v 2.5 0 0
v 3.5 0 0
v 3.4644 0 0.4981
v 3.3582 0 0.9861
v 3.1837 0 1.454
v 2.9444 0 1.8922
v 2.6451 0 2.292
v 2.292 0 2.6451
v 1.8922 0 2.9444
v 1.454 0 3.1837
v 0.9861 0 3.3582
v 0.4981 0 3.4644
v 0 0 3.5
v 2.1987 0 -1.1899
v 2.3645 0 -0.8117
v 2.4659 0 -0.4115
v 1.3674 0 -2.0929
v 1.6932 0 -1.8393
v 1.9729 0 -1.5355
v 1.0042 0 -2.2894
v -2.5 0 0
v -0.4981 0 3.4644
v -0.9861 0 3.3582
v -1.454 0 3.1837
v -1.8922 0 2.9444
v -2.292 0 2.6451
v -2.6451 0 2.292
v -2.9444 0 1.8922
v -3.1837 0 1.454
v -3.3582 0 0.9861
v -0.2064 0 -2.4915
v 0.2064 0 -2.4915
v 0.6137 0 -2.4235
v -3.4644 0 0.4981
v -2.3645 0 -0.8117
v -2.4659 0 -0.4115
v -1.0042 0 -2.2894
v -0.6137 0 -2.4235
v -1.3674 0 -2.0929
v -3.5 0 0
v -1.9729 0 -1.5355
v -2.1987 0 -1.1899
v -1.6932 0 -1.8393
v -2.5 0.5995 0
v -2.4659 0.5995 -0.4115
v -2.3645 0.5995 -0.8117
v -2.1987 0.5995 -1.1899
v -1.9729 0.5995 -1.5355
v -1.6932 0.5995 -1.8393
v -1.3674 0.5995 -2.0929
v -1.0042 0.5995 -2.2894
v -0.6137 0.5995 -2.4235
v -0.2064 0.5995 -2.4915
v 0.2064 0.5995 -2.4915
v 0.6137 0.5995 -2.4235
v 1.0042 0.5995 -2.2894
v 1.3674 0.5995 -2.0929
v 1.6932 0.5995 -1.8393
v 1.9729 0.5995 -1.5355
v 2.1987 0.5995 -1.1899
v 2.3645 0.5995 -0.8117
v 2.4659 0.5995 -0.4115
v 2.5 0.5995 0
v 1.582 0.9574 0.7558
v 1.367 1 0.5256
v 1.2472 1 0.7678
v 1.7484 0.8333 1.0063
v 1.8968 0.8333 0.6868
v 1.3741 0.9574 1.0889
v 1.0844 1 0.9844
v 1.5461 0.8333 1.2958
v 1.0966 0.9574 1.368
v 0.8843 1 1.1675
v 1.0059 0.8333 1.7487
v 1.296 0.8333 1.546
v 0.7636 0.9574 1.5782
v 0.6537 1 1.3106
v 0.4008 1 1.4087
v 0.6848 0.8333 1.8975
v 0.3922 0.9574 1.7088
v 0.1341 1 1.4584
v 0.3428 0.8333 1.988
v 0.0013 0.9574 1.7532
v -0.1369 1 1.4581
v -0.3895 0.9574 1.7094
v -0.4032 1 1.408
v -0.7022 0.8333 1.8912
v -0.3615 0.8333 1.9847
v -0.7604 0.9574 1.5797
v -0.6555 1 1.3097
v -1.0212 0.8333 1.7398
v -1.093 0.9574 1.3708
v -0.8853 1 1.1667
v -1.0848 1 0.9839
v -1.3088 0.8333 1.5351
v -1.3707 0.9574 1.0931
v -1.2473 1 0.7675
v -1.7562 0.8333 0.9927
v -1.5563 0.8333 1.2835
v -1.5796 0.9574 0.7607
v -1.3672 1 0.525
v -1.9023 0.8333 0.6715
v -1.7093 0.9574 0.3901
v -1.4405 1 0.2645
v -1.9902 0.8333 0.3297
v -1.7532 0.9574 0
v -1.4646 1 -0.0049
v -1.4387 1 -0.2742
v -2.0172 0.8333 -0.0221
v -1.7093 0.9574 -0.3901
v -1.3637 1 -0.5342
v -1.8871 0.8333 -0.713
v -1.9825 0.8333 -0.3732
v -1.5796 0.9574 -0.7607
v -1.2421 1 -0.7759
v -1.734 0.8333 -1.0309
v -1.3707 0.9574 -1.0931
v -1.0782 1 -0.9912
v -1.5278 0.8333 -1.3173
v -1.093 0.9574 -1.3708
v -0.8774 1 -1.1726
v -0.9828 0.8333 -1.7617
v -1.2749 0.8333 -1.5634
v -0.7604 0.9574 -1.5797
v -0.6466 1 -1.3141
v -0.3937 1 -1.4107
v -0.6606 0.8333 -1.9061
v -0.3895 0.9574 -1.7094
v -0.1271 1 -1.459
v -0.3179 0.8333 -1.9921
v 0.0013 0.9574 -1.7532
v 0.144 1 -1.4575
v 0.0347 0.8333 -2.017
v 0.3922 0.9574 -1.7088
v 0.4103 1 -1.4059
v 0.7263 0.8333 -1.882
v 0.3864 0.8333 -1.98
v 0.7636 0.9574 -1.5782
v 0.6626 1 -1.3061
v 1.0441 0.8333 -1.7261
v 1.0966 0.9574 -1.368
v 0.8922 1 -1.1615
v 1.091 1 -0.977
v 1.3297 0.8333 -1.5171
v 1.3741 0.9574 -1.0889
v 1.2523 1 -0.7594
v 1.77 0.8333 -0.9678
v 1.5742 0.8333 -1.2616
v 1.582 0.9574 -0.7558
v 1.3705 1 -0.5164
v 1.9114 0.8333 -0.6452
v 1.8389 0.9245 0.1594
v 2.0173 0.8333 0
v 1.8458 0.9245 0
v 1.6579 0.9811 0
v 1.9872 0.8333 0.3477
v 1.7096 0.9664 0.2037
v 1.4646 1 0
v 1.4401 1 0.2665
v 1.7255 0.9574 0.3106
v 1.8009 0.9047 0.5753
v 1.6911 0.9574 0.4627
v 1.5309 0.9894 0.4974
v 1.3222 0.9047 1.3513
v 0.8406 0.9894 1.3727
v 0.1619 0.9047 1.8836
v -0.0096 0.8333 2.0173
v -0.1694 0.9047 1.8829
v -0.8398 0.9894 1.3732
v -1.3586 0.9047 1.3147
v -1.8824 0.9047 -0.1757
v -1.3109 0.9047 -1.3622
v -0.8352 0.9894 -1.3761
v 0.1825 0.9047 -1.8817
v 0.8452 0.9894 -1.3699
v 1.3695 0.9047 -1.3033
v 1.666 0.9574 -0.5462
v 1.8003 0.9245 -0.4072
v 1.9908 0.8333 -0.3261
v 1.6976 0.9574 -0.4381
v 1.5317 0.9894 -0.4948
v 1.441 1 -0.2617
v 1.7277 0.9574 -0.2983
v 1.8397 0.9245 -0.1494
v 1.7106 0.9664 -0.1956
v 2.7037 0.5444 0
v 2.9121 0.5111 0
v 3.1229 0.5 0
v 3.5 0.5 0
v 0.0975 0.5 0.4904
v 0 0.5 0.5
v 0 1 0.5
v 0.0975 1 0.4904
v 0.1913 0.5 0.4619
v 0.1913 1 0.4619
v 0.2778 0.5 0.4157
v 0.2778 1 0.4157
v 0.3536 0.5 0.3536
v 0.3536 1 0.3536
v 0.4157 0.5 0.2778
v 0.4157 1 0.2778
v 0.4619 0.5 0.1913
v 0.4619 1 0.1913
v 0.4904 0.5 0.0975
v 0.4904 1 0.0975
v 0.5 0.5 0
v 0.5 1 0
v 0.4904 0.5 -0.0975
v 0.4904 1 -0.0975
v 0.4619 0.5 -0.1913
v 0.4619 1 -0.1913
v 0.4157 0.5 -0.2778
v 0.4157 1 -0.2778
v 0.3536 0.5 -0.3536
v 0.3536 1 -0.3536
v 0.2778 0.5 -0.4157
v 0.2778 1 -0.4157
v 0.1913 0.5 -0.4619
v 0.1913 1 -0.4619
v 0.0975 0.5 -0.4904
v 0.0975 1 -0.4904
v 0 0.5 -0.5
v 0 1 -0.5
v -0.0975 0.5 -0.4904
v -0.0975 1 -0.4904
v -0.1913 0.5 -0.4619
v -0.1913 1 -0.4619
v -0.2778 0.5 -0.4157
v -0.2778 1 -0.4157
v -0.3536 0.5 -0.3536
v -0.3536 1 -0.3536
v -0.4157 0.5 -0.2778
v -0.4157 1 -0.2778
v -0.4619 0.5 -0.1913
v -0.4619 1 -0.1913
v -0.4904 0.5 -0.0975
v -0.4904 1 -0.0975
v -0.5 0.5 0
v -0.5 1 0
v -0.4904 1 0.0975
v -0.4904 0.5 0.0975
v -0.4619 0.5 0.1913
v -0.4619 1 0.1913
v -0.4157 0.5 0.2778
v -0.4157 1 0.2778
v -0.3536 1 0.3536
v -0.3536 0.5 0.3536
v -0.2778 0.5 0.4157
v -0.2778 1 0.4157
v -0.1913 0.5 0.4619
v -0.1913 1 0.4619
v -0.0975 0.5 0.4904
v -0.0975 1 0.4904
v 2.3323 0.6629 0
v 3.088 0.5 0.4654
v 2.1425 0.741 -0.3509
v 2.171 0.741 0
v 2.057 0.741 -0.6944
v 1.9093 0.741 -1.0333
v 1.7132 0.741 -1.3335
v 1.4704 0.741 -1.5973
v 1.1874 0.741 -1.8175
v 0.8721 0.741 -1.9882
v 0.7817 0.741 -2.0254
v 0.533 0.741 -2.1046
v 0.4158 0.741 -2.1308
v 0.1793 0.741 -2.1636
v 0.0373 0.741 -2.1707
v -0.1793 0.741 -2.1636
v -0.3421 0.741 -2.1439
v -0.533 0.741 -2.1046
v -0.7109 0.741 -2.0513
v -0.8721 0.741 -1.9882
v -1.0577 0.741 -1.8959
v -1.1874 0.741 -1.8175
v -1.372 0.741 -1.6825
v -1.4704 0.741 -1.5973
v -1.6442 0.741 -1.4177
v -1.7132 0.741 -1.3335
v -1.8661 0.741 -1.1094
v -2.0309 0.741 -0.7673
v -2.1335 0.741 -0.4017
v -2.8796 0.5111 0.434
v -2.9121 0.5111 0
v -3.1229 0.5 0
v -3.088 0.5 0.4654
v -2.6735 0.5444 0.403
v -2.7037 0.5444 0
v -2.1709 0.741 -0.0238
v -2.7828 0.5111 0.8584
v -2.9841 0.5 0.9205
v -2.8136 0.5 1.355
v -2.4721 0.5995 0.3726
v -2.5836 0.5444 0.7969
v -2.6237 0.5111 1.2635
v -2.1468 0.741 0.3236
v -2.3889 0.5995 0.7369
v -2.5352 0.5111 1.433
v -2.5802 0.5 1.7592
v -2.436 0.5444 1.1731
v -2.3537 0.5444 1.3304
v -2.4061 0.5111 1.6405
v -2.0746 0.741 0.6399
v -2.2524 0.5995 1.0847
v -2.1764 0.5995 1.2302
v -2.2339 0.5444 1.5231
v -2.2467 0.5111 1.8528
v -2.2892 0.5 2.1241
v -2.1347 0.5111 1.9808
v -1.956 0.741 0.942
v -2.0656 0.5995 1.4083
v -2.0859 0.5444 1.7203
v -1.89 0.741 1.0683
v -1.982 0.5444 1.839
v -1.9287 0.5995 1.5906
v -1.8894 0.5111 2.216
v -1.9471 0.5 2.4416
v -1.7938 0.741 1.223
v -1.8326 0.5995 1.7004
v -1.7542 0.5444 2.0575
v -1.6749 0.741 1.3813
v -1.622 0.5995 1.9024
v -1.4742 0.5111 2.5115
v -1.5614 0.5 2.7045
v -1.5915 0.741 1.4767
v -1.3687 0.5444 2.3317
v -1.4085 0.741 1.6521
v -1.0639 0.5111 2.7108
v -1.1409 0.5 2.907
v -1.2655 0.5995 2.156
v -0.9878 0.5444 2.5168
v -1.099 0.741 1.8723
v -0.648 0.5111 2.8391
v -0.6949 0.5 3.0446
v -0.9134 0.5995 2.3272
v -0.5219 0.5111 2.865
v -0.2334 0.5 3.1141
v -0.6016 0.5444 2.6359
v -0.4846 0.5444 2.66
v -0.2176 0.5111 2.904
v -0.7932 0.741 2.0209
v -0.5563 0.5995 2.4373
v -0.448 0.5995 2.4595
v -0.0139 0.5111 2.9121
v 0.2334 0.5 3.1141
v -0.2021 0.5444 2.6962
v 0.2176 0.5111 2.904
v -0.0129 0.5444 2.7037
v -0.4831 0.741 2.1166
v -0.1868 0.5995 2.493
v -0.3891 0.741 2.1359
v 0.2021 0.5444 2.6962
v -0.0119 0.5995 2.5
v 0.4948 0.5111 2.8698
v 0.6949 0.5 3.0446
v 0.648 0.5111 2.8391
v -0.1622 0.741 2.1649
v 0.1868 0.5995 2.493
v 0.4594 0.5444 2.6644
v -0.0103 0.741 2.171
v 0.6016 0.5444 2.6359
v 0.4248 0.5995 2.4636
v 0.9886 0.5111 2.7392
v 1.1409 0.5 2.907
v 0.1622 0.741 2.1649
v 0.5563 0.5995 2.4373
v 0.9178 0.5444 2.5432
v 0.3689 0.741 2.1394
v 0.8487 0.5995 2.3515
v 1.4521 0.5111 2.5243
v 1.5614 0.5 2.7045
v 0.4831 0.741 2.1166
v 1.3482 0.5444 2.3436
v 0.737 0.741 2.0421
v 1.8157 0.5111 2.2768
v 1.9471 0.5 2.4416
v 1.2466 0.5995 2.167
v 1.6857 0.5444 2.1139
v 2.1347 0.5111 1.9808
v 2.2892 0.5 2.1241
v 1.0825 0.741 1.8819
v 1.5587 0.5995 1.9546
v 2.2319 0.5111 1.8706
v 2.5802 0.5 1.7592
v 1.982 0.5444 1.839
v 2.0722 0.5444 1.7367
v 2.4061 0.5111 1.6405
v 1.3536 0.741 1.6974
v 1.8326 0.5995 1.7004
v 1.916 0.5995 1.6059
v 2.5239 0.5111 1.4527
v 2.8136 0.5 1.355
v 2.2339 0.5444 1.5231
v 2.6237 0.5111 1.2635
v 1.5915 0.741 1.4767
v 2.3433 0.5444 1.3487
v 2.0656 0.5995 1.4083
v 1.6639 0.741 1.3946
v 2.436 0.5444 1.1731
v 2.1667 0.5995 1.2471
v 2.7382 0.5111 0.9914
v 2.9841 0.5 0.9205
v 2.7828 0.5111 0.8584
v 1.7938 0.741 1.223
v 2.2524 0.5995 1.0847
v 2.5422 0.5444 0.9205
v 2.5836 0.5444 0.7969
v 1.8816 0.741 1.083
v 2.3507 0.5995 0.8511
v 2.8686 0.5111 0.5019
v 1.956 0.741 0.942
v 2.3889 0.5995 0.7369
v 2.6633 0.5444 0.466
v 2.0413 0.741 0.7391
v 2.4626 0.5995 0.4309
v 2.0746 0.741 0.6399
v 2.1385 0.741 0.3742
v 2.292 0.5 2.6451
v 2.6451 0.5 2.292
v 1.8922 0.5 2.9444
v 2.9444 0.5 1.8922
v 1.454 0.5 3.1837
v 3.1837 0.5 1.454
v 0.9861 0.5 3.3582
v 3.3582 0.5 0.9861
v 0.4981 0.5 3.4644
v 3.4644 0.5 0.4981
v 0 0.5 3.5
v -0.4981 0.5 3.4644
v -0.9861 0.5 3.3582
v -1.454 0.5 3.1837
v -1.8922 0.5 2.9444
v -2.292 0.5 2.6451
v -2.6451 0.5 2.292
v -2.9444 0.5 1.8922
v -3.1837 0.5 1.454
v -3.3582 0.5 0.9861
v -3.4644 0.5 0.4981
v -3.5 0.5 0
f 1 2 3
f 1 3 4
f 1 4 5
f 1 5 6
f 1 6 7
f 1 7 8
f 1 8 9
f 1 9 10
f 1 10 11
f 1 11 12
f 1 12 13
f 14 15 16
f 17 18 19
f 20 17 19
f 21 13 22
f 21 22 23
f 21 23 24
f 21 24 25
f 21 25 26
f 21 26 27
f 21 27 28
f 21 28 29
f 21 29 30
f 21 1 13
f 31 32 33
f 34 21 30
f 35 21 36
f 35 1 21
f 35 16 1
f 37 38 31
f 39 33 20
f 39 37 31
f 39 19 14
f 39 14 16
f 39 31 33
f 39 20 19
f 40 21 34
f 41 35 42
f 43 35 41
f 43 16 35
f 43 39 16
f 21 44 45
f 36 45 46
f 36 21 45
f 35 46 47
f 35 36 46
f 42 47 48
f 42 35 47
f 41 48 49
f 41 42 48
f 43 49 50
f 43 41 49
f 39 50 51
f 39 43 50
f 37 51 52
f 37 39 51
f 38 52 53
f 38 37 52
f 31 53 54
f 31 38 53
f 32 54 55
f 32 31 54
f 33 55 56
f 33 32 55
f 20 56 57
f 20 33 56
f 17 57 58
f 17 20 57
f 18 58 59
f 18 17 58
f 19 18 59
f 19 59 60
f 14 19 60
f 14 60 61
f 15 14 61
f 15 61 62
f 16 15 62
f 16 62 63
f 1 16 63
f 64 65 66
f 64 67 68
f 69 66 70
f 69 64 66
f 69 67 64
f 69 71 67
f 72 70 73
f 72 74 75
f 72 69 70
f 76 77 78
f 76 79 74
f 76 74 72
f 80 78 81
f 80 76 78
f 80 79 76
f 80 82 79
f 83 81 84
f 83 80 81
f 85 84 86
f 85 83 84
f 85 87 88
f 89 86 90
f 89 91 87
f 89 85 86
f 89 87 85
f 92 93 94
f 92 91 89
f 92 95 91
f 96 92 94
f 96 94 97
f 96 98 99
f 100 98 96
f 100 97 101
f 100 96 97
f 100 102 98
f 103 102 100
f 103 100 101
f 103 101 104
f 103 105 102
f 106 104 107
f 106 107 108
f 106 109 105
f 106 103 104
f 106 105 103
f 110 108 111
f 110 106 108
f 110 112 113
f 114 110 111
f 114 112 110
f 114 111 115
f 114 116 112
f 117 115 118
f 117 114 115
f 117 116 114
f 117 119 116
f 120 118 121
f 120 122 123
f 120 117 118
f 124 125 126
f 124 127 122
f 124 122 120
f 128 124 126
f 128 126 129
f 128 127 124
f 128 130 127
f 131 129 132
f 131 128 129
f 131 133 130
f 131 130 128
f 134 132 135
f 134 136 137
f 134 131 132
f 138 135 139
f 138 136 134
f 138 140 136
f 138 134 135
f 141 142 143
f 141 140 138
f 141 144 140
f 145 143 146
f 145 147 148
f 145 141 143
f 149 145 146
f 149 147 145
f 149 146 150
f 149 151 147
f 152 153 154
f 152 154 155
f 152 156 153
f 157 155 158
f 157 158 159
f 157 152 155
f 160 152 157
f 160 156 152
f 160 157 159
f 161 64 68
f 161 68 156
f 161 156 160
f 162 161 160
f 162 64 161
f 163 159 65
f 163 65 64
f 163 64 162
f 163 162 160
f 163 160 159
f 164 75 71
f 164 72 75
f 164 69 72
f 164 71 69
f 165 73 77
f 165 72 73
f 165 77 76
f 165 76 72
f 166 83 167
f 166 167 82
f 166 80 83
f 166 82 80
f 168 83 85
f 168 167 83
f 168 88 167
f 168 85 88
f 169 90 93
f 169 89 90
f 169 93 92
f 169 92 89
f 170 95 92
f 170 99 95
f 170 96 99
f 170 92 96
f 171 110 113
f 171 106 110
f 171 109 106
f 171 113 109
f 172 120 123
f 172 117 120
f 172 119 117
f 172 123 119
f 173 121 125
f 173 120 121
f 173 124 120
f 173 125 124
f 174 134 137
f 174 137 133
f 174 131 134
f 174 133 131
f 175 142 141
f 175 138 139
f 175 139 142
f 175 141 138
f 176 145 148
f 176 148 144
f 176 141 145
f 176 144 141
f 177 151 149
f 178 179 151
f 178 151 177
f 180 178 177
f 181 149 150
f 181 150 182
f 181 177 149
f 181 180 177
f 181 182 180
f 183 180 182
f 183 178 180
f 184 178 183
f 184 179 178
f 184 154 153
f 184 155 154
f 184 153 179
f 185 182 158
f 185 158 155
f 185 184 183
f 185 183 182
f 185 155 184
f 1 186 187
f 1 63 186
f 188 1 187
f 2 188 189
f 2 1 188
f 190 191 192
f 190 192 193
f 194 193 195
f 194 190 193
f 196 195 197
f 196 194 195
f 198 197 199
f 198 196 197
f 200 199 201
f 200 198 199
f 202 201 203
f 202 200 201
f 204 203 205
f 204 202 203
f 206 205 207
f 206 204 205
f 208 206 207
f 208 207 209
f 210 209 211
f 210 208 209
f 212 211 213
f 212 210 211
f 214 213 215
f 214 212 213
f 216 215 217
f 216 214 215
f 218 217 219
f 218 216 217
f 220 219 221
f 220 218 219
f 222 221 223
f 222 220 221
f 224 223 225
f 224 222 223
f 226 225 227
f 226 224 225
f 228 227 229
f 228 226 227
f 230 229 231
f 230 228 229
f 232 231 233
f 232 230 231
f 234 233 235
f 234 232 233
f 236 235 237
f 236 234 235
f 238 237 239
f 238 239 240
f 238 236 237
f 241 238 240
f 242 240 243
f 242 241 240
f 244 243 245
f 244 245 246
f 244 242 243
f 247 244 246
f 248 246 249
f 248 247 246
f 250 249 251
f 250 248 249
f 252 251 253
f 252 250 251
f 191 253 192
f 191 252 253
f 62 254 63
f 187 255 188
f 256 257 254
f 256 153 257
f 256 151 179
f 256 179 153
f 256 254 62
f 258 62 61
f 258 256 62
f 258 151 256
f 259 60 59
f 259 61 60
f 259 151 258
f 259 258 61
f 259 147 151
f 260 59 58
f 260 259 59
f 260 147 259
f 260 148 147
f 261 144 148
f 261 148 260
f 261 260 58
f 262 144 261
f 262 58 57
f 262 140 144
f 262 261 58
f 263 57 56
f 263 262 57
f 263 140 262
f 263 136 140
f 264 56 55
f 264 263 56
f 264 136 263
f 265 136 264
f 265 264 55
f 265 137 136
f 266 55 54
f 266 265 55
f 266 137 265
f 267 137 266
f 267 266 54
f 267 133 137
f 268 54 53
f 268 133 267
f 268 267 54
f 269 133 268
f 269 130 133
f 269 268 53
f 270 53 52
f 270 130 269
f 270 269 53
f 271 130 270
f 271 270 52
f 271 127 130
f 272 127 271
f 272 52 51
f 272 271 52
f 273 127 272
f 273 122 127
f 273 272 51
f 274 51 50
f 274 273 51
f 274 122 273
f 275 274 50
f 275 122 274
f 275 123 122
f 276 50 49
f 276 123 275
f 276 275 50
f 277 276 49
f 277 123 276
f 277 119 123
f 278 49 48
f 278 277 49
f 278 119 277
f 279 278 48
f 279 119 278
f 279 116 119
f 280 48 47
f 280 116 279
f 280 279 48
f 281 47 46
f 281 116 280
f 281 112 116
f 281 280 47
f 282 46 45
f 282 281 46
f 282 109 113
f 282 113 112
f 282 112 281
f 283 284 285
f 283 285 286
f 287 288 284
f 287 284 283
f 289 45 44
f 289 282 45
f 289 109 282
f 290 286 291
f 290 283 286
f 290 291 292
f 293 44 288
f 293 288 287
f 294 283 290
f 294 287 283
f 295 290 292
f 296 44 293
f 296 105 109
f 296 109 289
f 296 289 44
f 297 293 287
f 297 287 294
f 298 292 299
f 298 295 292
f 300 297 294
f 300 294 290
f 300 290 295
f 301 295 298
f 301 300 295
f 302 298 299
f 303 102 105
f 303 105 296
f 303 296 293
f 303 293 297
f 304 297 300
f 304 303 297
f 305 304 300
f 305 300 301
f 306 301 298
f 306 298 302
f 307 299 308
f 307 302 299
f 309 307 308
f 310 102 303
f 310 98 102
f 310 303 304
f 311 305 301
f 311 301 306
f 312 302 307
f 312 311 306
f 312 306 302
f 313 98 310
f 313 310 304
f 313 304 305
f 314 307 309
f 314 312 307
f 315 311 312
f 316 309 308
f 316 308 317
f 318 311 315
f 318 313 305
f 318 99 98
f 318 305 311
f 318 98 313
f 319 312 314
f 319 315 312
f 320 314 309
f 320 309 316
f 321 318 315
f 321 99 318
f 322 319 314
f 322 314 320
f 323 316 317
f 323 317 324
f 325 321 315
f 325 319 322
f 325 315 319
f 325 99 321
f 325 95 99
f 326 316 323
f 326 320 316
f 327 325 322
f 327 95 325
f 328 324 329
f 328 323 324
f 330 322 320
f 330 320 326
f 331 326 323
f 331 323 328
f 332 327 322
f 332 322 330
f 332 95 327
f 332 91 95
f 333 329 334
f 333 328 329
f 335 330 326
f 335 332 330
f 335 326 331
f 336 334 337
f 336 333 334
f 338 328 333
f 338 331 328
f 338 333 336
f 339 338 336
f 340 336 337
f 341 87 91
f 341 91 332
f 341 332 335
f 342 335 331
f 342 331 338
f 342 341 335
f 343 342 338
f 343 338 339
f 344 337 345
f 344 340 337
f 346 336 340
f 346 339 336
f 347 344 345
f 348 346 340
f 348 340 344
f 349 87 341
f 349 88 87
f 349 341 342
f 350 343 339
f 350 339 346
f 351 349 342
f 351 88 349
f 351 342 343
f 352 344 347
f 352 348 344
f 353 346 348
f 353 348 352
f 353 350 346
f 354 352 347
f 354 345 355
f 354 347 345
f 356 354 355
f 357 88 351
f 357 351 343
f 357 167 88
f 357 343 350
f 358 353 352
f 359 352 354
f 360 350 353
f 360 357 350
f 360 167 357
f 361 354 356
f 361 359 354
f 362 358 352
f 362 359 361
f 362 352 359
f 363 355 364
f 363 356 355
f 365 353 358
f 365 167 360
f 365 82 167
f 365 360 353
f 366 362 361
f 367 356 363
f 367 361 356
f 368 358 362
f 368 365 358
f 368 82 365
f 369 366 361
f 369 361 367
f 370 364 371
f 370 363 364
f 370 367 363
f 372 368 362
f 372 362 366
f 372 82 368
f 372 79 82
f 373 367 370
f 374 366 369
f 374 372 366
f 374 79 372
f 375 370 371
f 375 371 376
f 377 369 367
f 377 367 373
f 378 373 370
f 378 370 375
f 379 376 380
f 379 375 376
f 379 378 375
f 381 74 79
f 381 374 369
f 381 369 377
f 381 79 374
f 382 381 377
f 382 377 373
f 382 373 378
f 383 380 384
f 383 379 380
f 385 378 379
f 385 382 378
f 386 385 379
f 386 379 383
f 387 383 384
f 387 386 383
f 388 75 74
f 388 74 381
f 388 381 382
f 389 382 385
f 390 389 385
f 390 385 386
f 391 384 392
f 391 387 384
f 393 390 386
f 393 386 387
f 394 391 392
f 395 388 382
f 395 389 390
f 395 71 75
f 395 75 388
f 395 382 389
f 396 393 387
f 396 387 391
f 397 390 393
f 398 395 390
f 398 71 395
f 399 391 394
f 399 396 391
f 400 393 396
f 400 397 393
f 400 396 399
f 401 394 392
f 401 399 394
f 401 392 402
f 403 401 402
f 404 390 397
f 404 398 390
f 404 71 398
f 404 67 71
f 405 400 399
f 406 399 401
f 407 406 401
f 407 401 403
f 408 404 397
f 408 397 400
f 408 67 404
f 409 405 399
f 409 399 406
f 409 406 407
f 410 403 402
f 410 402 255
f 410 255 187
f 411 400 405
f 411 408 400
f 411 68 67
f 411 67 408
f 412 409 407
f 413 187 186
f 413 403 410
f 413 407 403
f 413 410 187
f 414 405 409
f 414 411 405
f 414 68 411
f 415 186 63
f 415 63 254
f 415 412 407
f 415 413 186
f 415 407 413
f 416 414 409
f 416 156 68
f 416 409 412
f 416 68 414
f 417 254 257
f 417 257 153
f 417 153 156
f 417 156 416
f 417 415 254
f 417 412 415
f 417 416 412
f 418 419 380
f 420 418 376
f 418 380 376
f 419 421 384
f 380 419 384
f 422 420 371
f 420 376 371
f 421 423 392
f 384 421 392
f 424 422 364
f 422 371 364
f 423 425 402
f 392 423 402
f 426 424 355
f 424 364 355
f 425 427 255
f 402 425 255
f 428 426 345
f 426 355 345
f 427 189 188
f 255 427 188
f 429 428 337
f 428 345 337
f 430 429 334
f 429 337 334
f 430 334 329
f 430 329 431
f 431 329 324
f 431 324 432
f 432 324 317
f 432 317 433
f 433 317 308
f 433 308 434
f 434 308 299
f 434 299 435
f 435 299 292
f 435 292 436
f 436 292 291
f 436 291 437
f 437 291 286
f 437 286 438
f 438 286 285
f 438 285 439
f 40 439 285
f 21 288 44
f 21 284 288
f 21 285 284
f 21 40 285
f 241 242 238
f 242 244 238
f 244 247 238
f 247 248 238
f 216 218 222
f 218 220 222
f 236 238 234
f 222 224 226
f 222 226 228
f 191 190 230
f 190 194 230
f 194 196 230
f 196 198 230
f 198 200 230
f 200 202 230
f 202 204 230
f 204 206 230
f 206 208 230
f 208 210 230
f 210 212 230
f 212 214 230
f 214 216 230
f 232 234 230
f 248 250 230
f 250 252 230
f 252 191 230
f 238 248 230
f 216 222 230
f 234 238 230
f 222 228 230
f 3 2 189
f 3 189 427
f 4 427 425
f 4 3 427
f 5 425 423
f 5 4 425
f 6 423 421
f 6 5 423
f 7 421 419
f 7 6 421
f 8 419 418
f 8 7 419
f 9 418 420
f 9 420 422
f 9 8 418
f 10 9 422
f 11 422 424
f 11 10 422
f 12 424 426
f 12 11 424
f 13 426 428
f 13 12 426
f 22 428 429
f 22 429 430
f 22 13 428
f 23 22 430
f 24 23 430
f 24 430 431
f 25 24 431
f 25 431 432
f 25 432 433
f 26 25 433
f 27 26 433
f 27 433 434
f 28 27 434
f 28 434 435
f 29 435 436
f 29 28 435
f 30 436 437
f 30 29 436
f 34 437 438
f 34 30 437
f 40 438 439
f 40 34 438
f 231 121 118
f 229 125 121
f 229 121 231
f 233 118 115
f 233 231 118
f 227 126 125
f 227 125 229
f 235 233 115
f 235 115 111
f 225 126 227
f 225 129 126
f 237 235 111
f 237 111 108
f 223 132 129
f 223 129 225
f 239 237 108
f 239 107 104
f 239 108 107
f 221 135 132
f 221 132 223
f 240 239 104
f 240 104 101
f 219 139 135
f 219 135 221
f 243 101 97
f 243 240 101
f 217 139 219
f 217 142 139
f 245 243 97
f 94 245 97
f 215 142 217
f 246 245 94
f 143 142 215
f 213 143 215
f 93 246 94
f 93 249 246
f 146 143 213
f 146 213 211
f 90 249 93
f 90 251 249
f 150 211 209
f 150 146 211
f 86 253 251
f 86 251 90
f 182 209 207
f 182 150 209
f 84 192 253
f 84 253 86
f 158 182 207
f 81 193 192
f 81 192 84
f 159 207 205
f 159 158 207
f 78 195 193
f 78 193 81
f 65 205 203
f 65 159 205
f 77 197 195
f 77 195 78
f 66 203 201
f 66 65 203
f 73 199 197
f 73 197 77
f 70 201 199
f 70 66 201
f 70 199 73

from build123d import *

# Parameters (mm, degrees)
BOSS_EXTRUDE1_DEPTH = 0.5
SKETCH2_R           = 1.8
SKETCH2_R_2         = 0.5
BOSS_EXTRUDE2_DEPTH = 0.5
FILLET2_START       = 0.5
FILLET2_2_DEPTH     = 0.5
FILLET3_R           = 1


with BuildPart() as part:
    # Sketch1 → Boss-Extrude1 (new body)
    with BuildSketch(Plane(origin=(0, 0, 0), x_dir=(1, 0, 0), z_dir=(0, 1, 0))):
        with BuildLine():
            Line((-3.5, 0), (-2.5, 0))
            ThreePointArc((-2.5, 0), (0, 2.5), (2.5, 0))
            Line((2.5, 0), (3.5, 0))
            ThreePointArc((3.5, 0), (0, -3.5), (-3.5, 0))
        make_face()
    extrude(amount=BOSS_EXTRUDE1_DEPTH)

    # Sketch2 → Boss-Extrude2 (add)
    with BuildSketch(Plane(origin=(0, 0.5, 0), x_dir=(1, 0, 0), z_dir=(0, 1, 0))):
        with Locations(Location((0, 0, 0), (0, 0, 270))):
            Circle(SKETCH2_R)
        with Locations(Location((0, 0, 0), (0, 0, 270))):
            Circle(SKETCH2_R_2, mode=Mode.SUBTRACT)
    extrude(amount=BOSS_EXTRUDE2_DEPTH)

    # Fillet2: read off the stored shape, not the designer's step
    # Fillet2 outline → Fillet2 (revolve)
    with BuildSketch(Plane.XY):
        with BuildLine():
            ThreePointArc((3.122875656, 0.5), (2.415768875, 0.629171307), (1.8, 1))
            Line((1.8, 1), (1.8, 0.5))
            Line((1.8, 0.5), (3.122875656, 0.5))
        make_face()
    revolve(axis=Axis((0, 0, 0), (0, 1, 0)))

    # Fillet2 2 outline → Fillet2 2 (cut)
    with BuildSketch(Plane(origin=(0, 0, 0), x_dir=(1, 0, 0), z_dir=(0, 1, 0)).offset(FILLET2_START)):
        with BuildLine():
            ThreePointArc((-2.5, 0), (0, 2.5), (2.5, 0))
            Line((2.5, 0), (5, 0))
            Line((5, 0), (5, 5))
            Line((5, 5), (-5, 5))
            Line((-5, 5), (-5, 0))
            Line((-5, 0), (-2.5, 0))
        make_face()
    extrude(amount=FILLET2_2_DEPTH, mode=Mode.SUBTRACT)

    # Fillet3
    fillet3_edges = [part.edges().sort_by_distance(p)[0] for p in [
        (-1.8, 1, 0),
    ]]
    fillet(fillet3_edges, radius=FILLET3_R)


solid = part.part
